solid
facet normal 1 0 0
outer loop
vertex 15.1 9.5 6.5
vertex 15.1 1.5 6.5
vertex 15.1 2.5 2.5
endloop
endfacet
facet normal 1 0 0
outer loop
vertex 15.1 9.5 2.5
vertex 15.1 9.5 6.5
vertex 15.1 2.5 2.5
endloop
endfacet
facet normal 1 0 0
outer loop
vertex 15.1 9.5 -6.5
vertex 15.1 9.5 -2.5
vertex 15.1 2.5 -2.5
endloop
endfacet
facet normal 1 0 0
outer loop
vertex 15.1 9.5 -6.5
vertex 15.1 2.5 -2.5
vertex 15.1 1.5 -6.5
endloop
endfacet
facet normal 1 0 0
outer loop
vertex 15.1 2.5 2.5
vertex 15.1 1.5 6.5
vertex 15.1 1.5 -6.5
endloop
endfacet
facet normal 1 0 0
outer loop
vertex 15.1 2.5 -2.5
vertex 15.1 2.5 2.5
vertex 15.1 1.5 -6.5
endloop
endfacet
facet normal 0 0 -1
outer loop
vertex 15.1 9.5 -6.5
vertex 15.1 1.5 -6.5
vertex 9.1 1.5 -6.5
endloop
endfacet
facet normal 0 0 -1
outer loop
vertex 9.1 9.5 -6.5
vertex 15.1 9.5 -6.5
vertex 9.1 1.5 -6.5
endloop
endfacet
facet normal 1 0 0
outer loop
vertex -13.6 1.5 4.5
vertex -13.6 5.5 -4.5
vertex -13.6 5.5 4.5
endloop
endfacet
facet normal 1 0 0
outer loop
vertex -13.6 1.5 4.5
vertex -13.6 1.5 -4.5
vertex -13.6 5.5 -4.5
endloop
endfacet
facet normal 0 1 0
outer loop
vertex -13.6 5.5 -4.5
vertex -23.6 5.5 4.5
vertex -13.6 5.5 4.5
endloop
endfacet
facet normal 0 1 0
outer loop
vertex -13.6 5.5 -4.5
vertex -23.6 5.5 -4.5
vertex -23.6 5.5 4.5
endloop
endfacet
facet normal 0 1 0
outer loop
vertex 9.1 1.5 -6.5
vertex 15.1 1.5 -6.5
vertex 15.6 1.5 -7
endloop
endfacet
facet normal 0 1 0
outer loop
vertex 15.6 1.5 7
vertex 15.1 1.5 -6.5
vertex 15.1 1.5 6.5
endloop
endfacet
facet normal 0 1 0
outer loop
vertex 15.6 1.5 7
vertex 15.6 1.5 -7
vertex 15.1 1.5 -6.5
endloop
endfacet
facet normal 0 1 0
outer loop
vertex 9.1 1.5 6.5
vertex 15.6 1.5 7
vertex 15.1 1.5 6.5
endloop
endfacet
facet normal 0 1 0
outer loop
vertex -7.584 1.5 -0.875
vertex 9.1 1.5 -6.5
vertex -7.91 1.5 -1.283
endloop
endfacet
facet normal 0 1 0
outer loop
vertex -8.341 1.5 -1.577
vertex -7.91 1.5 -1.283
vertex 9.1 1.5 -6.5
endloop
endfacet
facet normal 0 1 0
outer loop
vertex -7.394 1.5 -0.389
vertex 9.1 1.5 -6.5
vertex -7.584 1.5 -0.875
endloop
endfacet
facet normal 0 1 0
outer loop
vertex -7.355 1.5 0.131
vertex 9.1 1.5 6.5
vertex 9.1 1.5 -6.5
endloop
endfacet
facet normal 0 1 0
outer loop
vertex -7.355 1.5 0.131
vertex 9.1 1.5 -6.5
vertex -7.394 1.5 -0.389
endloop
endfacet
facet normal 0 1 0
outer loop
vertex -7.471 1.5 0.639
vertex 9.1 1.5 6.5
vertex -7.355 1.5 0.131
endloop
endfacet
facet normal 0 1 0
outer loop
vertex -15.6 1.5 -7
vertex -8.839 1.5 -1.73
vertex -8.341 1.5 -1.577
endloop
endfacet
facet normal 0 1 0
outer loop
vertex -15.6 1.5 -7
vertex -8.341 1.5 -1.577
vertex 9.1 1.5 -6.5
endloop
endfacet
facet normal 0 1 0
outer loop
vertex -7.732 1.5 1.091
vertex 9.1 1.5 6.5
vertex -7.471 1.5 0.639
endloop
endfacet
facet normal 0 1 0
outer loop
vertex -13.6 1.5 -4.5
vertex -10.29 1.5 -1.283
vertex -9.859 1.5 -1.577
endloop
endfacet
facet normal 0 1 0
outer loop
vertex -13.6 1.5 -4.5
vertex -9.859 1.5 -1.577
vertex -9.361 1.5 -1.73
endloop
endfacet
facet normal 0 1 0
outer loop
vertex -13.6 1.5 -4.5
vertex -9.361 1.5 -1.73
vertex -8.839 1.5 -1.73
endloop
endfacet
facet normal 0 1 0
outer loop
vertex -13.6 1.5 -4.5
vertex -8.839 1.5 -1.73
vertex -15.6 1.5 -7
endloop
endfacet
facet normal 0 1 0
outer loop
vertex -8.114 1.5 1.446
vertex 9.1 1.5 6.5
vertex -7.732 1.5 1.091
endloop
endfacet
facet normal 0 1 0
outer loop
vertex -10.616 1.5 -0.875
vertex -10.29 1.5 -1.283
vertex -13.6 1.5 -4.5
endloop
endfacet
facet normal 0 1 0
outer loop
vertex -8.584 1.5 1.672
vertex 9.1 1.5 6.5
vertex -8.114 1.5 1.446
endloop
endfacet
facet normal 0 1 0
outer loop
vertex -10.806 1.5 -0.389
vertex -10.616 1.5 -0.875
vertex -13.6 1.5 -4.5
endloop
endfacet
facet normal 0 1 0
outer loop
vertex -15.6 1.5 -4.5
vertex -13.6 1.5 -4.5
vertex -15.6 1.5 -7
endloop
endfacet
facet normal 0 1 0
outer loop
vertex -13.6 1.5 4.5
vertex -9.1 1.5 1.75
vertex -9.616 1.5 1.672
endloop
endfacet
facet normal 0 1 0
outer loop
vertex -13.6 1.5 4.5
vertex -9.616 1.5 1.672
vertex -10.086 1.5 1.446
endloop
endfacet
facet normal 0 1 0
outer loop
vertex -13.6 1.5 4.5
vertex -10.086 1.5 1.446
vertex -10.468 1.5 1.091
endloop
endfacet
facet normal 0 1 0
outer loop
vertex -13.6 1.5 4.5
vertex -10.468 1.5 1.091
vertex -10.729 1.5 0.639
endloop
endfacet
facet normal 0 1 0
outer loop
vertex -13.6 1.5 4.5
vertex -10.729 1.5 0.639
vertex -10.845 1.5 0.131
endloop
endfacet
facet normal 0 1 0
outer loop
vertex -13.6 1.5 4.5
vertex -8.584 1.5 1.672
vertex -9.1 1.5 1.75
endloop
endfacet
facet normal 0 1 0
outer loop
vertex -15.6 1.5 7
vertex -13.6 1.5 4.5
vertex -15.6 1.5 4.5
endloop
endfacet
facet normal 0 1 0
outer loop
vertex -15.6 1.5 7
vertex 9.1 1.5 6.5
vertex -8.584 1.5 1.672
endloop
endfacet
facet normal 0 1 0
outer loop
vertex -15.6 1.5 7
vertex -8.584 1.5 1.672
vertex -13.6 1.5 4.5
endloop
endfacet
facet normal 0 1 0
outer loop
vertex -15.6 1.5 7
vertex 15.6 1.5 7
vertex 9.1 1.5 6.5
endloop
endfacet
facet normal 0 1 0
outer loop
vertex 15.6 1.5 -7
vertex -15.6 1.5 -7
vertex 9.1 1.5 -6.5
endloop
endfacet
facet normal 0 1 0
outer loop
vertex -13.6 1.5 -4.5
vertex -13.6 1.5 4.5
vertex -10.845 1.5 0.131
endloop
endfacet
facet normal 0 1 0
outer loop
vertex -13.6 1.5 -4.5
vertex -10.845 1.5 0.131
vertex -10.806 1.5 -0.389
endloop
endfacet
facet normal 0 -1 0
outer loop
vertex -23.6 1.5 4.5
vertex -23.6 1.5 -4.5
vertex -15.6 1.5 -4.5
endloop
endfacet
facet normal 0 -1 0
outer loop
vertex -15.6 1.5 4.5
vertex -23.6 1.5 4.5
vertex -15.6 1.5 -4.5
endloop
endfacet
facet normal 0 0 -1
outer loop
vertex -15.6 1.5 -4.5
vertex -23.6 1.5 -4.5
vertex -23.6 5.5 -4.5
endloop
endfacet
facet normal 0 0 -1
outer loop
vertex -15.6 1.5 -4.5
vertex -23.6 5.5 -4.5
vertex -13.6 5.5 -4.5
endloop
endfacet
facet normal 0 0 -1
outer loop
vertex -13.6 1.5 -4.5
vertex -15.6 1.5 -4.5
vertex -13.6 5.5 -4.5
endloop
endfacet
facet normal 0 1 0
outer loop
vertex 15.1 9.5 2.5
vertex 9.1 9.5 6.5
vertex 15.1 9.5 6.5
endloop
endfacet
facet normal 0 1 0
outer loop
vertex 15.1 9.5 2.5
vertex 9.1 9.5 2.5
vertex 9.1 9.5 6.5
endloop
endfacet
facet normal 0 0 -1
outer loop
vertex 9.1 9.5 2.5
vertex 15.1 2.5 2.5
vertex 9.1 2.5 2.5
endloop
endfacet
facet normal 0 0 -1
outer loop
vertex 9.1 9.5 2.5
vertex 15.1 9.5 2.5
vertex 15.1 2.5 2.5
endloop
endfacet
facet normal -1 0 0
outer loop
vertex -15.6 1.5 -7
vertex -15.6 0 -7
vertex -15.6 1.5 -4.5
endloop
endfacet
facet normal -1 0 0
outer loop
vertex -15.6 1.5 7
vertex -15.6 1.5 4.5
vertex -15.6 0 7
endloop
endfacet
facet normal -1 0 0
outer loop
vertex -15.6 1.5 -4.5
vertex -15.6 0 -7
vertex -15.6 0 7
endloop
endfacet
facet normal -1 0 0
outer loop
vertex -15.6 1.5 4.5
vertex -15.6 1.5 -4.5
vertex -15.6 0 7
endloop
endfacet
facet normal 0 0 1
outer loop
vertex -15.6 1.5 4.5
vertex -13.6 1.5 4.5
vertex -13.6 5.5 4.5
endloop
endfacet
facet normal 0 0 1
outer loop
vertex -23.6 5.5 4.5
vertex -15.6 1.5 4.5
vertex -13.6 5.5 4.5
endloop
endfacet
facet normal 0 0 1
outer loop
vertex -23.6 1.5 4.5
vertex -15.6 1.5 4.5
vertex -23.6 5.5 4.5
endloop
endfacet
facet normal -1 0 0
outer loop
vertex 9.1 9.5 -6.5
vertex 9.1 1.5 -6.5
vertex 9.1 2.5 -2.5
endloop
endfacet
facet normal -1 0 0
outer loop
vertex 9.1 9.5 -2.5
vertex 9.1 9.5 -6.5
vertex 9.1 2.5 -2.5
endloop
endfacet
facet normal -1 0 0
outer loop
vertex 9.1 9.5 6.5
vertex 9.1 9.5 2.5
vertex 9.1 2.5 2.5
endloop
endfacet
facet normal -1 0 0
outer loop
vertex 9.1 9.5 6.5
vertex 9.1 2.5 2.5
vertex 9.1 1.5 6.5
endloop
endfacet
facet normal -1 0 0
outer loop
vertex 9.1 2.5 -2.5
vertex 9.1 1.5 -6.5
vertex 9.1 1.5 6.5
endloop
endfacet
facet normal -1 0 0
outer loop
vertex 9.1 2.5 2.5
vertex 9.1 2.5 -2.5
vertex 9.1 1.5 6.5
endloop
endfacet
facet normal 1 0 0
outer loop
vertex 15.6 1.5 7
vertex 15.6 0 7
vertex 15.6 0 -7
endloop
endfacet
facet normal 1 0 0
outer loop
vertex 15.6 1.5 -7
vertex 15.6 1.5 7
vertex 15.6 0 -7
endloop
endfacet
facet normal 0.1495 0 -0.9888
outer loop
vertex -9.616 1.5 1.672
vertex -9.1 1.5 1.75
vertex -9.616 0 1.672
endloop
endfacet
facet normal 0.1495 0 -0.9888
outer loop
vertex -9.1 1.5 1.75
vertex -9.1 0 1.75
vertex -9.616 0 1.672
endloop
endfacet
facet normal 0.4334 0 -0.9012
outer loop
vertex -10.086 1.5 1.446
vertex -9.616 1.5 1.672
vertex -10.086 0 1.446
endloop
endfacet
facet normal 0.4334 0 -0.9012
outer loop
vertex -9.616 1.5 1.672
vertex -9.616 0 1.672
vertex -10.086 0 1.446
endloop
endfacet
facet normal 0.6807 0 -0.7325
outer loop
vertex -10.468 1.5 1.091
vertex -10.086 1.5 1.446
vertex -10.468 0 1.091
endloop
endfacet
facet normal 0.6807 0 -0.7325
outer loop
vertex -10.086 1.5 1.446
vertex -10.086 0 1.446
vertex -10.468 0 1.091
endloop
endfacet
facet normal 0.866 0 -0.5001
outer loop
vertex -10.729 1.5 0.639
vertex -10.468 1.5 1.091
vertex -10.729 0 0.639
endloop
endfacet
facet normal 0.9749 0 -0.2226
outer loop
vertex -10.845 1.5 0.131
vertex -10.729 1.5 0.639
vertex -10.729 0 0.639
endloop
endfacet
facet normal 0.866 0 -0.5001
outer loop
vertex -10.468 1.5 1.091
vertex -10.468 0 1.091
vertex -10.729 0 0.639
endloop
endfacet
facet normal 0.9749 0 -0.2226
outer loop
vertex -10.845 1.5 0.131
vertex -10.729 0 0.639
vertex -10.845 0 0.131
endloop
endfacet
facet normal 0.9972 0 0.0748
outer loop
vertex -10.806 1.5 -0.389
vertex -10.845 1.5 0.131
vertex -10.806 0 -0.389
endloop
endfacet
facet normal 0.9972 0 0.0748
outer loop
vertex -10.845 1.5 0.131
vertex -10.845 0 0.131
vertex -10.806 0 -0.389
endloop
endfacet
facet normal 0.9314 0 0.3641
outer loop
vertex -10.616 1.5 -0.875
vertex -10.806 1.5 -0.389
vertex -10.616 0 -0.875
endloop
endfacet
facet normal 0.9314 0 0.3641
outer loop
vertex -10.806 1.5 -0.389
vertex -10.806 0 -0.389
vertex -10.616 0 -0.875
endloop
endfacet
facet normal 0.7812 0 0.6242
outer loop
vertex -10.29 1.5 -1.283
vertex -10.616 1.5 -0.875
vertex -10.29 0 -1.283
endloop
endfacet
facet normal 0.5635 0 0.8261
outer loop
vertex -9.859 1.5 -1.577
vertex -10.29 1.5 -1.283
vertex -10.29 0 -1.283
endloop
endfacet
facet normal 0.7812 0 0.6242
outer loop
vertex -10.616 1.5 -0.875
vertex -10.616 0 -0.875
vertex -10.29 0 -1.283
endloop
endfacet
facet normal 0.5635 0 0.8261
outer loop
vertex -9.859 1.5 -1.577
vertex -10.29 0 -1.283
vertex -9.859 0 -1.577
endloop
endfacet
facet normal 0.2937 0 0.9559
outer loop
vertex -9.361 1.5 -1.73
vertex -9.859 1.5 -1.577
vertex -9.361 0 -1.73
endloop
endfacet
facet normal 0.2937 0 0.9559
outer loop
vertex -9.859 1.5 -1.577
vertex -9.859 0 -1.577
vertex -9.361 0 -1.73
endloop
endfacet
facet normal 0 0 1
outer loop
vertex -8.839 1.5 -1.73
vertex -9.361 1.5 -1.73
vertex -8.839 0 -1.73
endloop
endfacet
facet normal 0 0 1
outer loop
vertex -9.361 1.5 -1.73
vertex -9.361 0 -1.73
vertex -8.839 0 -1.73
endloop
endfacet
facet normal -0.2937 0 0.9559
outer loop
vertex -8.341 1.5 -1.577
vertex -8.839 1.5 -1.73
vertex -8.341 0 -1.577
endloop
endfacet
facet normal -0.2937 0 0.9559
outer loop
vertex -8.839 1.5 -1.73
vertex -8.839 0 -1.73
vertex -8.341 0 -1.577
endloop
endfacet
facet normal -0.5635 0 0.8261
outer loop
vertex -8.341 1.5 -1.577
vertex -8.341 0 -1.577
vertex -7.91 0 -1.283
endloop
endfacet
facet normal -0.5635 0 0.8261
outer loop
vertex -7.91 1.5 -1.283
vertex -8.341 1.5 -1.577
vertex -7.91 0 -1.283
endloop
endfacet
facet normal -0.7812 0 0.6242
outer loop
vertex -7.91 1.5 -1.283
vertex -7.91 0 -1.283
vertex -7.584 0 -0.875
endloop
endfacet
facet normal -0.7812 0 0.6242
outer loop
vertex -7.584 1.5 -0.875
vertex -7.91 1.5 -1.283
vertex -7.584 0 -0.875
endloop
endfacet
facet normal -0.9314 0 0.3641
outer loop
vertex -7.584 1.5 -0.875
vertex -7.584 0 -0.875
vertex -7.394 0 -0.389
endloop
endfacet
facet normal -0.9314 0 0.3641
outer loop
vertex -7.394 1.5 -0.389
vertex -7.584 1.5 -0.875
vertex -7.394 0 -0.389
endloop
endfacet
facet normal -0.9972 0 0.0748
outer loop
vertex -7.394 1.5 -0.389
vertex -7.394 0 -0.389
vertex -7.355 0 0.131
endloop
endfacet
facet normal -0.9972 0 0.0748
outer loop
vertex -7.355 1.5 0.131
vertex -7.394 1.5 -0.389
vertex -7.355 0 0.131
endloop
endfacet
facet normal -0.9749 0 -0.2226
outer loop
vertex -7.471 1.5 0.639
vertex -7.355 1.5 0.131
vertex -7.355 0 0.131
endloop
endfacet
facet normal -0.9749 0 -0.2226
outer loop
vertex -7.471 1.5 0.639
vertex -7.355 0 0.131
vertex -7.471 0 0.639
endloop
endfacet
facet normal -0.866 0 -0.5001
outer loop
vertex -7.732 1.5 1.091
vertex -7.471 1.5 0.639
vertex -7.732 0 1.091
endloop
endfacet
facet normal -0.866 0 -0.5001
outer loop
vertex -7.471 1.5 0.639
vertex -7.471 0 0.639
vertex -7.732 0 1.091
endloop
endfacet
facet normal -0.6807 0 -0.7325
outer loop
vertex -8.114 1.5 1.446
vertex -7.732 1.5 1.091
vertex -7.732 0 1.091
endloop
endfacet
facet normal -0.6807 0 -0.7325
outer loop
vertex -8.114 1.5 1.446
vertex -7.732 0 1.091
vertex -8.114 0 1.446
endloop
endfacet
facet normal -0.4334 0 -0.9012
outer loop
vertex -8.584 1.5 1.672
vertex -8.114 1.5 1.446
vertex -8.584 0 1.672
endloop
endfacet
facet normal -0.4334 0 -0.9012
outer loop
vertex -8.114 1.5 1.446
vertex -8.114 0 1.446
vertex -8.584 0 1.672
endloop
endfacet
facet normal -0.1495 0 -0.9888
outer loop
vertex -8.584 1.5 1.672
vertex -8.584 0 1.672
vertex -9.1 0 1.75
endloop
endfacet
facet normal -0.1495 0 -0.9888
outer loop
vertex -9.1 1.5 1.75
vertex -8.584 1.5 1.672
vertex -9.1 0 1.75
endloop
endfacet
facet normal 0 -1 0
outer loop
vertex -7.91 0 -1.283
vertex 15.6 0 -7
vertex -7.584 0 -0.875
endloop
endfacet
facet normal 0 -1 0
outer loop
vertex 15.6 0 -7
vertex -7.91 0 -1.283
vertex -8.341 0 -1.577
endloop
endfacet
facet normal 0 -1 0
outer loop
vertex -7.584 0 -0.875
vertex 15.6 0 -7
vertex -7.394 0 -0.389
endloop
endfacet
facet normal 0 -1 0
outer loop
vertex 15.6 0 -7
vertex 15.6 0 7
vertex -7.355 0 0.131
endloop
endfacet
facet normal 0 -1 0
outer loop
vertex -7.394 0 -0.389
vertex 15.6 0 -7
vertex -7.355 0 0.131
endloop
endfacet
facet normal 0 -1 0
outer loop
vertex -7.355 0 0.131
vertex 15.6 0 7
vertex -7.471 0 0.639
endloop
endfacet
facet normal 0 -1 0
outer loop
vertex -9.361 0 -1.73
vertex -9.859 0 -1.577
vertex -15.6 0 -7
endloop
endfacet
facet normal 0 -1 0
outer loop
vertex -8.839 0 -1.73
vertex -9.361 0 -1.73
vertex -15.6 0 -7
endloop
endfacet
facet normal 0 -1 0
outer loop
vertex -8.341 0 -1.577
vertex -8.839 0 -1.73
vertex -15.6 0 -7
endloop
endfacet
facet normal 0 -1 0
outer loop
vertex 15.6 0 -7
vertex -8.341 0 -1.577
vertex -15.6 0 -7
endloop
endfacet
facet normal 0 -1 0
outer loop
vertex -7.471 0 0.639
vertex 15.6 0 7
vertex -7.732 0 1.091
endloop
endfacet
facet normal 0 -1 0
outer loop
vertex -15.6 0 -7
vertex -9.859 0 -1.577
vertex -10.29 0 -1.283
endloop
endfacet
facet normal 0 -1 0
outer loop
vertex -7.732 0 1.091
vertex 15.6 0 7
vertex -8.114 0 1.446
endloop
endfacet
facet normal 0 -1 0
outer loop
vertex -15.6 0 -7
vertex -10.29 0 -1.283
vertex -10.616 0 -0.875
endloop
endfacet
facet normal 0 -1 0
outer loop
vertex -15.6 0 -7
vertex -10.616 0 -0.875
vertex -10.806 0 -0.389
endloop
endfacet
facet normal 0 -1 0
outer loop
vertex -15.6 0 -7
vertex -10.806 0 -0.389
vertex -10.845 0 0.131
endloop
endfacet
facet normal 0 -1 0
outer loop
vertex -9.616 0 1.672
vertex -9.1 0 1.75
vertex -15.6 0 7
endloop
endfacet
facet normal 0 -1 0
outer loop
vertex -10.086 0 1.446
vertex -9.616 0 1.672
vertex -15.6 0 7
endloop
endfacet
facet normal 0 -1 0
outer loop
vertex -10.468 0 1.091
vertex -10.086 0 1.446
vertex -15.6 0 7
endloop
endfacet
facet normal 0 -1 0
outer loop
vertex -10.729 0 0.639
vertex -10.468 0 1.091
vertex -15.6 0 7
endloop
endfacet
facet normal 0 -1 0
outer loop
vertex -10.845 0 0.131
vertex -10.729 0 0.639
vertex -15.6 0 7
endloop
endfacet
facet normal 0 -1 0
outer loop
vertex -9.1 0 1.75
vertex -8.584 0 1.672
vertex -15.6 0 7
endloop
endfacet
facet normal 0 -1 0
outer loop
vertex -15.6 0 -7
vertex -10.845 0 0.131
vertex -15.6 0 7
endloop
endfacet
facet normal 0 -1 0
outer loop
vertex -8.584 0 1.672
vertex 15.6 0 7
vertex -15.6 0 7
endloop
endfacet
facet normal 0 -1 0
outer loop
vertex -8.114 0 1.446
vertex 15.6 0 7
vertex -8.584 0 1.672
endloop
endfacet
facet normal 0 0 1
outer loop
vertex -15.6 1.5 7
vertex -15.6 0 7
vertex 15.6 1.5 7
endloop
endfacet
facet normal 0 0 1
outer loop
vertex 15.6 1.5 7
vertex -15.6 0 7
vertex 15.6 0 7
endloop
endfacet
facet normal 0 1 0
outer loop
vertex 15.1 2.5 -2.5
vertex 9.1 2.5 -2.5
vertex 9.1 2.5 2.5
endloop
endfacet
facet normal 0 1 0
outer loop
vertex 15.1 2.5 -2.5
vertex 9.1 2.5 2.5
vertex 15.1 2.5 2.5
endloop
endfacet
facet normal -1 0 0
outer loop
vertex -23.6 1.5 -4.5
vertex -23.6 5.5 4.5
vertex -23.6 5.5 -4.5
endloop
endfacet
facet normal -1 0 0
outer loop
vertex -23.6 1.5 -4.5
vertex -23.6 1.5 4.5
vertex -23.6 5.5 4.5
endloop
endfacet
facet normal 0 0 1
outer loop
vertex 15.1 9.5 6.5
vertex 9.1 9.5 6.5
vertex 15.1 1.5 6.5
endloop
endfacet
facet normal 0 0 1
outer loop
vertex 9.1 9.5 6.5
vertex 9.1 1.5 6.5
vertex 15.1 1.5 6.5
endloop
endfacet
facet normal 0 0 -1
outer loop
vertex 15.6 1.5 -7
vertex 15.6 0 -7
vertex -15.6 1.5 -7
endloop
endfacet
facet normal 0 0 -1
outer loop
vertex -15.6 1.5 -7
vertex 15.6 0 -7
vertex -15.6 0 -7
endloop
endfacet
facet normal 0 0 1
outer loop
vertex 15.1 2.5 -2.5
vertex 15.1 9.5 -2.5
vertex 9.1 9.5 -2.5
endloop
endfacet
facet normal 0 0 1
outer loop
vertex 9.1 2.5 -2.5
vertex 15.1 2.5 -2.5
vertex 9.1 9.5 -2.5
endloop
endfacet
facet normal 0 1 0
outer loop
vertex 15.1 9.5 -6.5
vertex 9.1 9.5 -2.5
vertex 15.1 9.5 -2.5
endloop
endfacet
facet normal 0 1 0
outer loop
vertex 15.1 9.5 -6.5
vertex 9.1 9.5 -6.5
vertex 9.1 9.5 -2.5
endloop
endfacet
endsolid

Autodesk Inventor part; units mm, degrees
ref_plane "YZ Plane" through (0, 0, 0) normal (1, 0, 0) x (0, 1, 0)
ref_plane "XZ Plane" through (0, 0, 0) normal (0, 1, 0) x (-1, 0, 0)
ref_plane "XY Plane" through (0, 0, 0) normal (0, 0, 1) x (1, 0, 0)
sketch "Sketch1" plane through (0, 0, 0) normal (0, 1, 0) x (-1, 0, 0)
  line L0 (15.6, 7) -> (-15.6, 7)
  line L1 (-15.6, 7) -> (-15.6, -7)
  line L2 (-15.6, -7) -> (15.6, -7)
  line L3 (15.6, -7) -> (15.6, 7)
  line L4 (15.6, 7) -> (-15.6, -7) construction
  line L5 (-15.6, 7) -> (15.6, -7) construction
  point P0 (0, 0)
  dimension "d0" = 31.2
  dimension "d1" = 14
extrude "Extrusion1" add sketch "Sketch1" along normal blind 1.5
sketch "Sketch2" plane through (0, 1.5, 0) normal (0, 1, 0) x (1, 0, 0)
  line L0 (9.1, -6.5) -> (15.1, -6.5)
  line L1 (15.1, -6.5) -> (15.1, 6.5)
  line L2 (15.1, 6.5) -> (9.1, 6.5)
  line L3 (9.1, 6.5) -> (9.1, -6.5)
  line L4 (9.1, -6.5) -> (15.1, 6.5) construction
  line L5 (15.1, -6.5) -> (9.1, 6.5) construction
  line L6 (15.6, 7) -> (-15.6, 7) projected
  line L7 (15.6, -7) -> (15.6, 7) projected
  point P0 (0, 0)
  point P1 (12.1, 0)
  point P2 (15.1, 0)
  point P3 (15.1, 0)
  dimension "d4" = 6
  dimension "d5" = 13
  dimension "d6" = 7
  dimension "d7" = 0.5
extrude "Extrusion2" add sketch "Sketch2" along normal blind 8
sketch "Sketch3" plane through (0, 9.5, 0) normal (0, 1, 0) x (1, 0, 0)
  line L0 (15.1, -6.5) -> (15.1, 6.5) construction
  line L1 (15.1, 6.5) -> (9.1, 6.5) construction
  line L2 (9.1, 6.5) -> (9.1, -6.5) construction
  line L3 (9.1, -6.5) -> (15.1, -6.5) construction
  line L4 (9.1, -6.5) -> (15.1, -6.5)
  line L5 (15.1, -6.5) -> (15.1, -2.5)
  line L6 (15.1, -2.5) -> (9.1, -2.5)
  line L7 (9.1, -2.5) -> (9.1, -6.5)
  line L8 (9.1, 6.5) -> (15.1, 6.5)
  line L9 (15.1, 6.5) -> (15.1, 2.5)
  line L10 (15.1, 2.5) -> (9.1, 2.5)
  line L11 (9.1, 2.5) -> (9.1, 6.5)
  line L12 (9.1, -2.5) -> (15.1, -2.5)
  line L13 (15.1, -2.5) -> (15.1, 2.5)
  line L14 (15.1, 2.5) -> (9.1, 2.5)
  line L15 (9.1, 2.5) -> (9.1, -2.5)
  point P0 (0, 0)
  dimension "d10" = 4
  dimension "d11" = 4
extrude "Extrusion3" cut sketch "Sketch3" against normal blind 7 contours L15 L10 L13 L6
sketch "Sketch4" plane through (0, 1.5, 0) normal (0, 1, 0) x (1, 0, 0)
  line L0 (-15.6, 7) -> (-15.6, -7) construction
  line L1 (-15.6, 0) -> (-9.1, 0) construction
  point P0 (0, 0)
  dimension "d14" = 6.5
hole "Hole1" at (-9.1, 1.5, 0) direction (0, -1, 0) diameter 3.5 end through all
sketch "Sketch5" plane through (0, 1.5, 0) normal (0, 1, 0) x (1, 0, 0)
  circle A0 centre (-9.1, 0) radius 1.75 construction
  line L0 (15.1, -6.5) -> (9.1, -6.5) construction
  line L1 (9.1, -6.5) -> (9.1, 6.5) construction
  line L2 (9.1, 6.5) -> (15.1, 6.5) construction
  line L3 (15.1, 6.5) -> (15.1, -6.5) construction
  line L4 (15.6, -7) -> (15.6, 7) construction
  line L5 (15.6, 7) -> (-15.6, 7) construction
  line L6 (-15.6, 7) -> (-15.6, -7) construction
  line L7 (-15.6, -7) -> (15.6, -7) construction
  line L8 (-23.6, 4.5) -> (-13.6, 4.5)
  line L9 (-13.6, 4.5) -> (-13.6, -4.5)
  line L10 (-13.6, -4.5) -> (-23.6, -4.5)
  line L11 (-23.6, -4.5) -> (-23.6, 4.5)
  line L12 (-13.6, 7) -> (-13.6, -7) construction
  point P0 (0, 0)
  point P1 (-13.6, 0)
  dimension "d22" = 10
  dimension "d23" = 9
  dimension "d24" = 2
extrude "Extrusion4" add sketch "Sketch5" along normal blind 4
properties part number "irencoder_footprint"
